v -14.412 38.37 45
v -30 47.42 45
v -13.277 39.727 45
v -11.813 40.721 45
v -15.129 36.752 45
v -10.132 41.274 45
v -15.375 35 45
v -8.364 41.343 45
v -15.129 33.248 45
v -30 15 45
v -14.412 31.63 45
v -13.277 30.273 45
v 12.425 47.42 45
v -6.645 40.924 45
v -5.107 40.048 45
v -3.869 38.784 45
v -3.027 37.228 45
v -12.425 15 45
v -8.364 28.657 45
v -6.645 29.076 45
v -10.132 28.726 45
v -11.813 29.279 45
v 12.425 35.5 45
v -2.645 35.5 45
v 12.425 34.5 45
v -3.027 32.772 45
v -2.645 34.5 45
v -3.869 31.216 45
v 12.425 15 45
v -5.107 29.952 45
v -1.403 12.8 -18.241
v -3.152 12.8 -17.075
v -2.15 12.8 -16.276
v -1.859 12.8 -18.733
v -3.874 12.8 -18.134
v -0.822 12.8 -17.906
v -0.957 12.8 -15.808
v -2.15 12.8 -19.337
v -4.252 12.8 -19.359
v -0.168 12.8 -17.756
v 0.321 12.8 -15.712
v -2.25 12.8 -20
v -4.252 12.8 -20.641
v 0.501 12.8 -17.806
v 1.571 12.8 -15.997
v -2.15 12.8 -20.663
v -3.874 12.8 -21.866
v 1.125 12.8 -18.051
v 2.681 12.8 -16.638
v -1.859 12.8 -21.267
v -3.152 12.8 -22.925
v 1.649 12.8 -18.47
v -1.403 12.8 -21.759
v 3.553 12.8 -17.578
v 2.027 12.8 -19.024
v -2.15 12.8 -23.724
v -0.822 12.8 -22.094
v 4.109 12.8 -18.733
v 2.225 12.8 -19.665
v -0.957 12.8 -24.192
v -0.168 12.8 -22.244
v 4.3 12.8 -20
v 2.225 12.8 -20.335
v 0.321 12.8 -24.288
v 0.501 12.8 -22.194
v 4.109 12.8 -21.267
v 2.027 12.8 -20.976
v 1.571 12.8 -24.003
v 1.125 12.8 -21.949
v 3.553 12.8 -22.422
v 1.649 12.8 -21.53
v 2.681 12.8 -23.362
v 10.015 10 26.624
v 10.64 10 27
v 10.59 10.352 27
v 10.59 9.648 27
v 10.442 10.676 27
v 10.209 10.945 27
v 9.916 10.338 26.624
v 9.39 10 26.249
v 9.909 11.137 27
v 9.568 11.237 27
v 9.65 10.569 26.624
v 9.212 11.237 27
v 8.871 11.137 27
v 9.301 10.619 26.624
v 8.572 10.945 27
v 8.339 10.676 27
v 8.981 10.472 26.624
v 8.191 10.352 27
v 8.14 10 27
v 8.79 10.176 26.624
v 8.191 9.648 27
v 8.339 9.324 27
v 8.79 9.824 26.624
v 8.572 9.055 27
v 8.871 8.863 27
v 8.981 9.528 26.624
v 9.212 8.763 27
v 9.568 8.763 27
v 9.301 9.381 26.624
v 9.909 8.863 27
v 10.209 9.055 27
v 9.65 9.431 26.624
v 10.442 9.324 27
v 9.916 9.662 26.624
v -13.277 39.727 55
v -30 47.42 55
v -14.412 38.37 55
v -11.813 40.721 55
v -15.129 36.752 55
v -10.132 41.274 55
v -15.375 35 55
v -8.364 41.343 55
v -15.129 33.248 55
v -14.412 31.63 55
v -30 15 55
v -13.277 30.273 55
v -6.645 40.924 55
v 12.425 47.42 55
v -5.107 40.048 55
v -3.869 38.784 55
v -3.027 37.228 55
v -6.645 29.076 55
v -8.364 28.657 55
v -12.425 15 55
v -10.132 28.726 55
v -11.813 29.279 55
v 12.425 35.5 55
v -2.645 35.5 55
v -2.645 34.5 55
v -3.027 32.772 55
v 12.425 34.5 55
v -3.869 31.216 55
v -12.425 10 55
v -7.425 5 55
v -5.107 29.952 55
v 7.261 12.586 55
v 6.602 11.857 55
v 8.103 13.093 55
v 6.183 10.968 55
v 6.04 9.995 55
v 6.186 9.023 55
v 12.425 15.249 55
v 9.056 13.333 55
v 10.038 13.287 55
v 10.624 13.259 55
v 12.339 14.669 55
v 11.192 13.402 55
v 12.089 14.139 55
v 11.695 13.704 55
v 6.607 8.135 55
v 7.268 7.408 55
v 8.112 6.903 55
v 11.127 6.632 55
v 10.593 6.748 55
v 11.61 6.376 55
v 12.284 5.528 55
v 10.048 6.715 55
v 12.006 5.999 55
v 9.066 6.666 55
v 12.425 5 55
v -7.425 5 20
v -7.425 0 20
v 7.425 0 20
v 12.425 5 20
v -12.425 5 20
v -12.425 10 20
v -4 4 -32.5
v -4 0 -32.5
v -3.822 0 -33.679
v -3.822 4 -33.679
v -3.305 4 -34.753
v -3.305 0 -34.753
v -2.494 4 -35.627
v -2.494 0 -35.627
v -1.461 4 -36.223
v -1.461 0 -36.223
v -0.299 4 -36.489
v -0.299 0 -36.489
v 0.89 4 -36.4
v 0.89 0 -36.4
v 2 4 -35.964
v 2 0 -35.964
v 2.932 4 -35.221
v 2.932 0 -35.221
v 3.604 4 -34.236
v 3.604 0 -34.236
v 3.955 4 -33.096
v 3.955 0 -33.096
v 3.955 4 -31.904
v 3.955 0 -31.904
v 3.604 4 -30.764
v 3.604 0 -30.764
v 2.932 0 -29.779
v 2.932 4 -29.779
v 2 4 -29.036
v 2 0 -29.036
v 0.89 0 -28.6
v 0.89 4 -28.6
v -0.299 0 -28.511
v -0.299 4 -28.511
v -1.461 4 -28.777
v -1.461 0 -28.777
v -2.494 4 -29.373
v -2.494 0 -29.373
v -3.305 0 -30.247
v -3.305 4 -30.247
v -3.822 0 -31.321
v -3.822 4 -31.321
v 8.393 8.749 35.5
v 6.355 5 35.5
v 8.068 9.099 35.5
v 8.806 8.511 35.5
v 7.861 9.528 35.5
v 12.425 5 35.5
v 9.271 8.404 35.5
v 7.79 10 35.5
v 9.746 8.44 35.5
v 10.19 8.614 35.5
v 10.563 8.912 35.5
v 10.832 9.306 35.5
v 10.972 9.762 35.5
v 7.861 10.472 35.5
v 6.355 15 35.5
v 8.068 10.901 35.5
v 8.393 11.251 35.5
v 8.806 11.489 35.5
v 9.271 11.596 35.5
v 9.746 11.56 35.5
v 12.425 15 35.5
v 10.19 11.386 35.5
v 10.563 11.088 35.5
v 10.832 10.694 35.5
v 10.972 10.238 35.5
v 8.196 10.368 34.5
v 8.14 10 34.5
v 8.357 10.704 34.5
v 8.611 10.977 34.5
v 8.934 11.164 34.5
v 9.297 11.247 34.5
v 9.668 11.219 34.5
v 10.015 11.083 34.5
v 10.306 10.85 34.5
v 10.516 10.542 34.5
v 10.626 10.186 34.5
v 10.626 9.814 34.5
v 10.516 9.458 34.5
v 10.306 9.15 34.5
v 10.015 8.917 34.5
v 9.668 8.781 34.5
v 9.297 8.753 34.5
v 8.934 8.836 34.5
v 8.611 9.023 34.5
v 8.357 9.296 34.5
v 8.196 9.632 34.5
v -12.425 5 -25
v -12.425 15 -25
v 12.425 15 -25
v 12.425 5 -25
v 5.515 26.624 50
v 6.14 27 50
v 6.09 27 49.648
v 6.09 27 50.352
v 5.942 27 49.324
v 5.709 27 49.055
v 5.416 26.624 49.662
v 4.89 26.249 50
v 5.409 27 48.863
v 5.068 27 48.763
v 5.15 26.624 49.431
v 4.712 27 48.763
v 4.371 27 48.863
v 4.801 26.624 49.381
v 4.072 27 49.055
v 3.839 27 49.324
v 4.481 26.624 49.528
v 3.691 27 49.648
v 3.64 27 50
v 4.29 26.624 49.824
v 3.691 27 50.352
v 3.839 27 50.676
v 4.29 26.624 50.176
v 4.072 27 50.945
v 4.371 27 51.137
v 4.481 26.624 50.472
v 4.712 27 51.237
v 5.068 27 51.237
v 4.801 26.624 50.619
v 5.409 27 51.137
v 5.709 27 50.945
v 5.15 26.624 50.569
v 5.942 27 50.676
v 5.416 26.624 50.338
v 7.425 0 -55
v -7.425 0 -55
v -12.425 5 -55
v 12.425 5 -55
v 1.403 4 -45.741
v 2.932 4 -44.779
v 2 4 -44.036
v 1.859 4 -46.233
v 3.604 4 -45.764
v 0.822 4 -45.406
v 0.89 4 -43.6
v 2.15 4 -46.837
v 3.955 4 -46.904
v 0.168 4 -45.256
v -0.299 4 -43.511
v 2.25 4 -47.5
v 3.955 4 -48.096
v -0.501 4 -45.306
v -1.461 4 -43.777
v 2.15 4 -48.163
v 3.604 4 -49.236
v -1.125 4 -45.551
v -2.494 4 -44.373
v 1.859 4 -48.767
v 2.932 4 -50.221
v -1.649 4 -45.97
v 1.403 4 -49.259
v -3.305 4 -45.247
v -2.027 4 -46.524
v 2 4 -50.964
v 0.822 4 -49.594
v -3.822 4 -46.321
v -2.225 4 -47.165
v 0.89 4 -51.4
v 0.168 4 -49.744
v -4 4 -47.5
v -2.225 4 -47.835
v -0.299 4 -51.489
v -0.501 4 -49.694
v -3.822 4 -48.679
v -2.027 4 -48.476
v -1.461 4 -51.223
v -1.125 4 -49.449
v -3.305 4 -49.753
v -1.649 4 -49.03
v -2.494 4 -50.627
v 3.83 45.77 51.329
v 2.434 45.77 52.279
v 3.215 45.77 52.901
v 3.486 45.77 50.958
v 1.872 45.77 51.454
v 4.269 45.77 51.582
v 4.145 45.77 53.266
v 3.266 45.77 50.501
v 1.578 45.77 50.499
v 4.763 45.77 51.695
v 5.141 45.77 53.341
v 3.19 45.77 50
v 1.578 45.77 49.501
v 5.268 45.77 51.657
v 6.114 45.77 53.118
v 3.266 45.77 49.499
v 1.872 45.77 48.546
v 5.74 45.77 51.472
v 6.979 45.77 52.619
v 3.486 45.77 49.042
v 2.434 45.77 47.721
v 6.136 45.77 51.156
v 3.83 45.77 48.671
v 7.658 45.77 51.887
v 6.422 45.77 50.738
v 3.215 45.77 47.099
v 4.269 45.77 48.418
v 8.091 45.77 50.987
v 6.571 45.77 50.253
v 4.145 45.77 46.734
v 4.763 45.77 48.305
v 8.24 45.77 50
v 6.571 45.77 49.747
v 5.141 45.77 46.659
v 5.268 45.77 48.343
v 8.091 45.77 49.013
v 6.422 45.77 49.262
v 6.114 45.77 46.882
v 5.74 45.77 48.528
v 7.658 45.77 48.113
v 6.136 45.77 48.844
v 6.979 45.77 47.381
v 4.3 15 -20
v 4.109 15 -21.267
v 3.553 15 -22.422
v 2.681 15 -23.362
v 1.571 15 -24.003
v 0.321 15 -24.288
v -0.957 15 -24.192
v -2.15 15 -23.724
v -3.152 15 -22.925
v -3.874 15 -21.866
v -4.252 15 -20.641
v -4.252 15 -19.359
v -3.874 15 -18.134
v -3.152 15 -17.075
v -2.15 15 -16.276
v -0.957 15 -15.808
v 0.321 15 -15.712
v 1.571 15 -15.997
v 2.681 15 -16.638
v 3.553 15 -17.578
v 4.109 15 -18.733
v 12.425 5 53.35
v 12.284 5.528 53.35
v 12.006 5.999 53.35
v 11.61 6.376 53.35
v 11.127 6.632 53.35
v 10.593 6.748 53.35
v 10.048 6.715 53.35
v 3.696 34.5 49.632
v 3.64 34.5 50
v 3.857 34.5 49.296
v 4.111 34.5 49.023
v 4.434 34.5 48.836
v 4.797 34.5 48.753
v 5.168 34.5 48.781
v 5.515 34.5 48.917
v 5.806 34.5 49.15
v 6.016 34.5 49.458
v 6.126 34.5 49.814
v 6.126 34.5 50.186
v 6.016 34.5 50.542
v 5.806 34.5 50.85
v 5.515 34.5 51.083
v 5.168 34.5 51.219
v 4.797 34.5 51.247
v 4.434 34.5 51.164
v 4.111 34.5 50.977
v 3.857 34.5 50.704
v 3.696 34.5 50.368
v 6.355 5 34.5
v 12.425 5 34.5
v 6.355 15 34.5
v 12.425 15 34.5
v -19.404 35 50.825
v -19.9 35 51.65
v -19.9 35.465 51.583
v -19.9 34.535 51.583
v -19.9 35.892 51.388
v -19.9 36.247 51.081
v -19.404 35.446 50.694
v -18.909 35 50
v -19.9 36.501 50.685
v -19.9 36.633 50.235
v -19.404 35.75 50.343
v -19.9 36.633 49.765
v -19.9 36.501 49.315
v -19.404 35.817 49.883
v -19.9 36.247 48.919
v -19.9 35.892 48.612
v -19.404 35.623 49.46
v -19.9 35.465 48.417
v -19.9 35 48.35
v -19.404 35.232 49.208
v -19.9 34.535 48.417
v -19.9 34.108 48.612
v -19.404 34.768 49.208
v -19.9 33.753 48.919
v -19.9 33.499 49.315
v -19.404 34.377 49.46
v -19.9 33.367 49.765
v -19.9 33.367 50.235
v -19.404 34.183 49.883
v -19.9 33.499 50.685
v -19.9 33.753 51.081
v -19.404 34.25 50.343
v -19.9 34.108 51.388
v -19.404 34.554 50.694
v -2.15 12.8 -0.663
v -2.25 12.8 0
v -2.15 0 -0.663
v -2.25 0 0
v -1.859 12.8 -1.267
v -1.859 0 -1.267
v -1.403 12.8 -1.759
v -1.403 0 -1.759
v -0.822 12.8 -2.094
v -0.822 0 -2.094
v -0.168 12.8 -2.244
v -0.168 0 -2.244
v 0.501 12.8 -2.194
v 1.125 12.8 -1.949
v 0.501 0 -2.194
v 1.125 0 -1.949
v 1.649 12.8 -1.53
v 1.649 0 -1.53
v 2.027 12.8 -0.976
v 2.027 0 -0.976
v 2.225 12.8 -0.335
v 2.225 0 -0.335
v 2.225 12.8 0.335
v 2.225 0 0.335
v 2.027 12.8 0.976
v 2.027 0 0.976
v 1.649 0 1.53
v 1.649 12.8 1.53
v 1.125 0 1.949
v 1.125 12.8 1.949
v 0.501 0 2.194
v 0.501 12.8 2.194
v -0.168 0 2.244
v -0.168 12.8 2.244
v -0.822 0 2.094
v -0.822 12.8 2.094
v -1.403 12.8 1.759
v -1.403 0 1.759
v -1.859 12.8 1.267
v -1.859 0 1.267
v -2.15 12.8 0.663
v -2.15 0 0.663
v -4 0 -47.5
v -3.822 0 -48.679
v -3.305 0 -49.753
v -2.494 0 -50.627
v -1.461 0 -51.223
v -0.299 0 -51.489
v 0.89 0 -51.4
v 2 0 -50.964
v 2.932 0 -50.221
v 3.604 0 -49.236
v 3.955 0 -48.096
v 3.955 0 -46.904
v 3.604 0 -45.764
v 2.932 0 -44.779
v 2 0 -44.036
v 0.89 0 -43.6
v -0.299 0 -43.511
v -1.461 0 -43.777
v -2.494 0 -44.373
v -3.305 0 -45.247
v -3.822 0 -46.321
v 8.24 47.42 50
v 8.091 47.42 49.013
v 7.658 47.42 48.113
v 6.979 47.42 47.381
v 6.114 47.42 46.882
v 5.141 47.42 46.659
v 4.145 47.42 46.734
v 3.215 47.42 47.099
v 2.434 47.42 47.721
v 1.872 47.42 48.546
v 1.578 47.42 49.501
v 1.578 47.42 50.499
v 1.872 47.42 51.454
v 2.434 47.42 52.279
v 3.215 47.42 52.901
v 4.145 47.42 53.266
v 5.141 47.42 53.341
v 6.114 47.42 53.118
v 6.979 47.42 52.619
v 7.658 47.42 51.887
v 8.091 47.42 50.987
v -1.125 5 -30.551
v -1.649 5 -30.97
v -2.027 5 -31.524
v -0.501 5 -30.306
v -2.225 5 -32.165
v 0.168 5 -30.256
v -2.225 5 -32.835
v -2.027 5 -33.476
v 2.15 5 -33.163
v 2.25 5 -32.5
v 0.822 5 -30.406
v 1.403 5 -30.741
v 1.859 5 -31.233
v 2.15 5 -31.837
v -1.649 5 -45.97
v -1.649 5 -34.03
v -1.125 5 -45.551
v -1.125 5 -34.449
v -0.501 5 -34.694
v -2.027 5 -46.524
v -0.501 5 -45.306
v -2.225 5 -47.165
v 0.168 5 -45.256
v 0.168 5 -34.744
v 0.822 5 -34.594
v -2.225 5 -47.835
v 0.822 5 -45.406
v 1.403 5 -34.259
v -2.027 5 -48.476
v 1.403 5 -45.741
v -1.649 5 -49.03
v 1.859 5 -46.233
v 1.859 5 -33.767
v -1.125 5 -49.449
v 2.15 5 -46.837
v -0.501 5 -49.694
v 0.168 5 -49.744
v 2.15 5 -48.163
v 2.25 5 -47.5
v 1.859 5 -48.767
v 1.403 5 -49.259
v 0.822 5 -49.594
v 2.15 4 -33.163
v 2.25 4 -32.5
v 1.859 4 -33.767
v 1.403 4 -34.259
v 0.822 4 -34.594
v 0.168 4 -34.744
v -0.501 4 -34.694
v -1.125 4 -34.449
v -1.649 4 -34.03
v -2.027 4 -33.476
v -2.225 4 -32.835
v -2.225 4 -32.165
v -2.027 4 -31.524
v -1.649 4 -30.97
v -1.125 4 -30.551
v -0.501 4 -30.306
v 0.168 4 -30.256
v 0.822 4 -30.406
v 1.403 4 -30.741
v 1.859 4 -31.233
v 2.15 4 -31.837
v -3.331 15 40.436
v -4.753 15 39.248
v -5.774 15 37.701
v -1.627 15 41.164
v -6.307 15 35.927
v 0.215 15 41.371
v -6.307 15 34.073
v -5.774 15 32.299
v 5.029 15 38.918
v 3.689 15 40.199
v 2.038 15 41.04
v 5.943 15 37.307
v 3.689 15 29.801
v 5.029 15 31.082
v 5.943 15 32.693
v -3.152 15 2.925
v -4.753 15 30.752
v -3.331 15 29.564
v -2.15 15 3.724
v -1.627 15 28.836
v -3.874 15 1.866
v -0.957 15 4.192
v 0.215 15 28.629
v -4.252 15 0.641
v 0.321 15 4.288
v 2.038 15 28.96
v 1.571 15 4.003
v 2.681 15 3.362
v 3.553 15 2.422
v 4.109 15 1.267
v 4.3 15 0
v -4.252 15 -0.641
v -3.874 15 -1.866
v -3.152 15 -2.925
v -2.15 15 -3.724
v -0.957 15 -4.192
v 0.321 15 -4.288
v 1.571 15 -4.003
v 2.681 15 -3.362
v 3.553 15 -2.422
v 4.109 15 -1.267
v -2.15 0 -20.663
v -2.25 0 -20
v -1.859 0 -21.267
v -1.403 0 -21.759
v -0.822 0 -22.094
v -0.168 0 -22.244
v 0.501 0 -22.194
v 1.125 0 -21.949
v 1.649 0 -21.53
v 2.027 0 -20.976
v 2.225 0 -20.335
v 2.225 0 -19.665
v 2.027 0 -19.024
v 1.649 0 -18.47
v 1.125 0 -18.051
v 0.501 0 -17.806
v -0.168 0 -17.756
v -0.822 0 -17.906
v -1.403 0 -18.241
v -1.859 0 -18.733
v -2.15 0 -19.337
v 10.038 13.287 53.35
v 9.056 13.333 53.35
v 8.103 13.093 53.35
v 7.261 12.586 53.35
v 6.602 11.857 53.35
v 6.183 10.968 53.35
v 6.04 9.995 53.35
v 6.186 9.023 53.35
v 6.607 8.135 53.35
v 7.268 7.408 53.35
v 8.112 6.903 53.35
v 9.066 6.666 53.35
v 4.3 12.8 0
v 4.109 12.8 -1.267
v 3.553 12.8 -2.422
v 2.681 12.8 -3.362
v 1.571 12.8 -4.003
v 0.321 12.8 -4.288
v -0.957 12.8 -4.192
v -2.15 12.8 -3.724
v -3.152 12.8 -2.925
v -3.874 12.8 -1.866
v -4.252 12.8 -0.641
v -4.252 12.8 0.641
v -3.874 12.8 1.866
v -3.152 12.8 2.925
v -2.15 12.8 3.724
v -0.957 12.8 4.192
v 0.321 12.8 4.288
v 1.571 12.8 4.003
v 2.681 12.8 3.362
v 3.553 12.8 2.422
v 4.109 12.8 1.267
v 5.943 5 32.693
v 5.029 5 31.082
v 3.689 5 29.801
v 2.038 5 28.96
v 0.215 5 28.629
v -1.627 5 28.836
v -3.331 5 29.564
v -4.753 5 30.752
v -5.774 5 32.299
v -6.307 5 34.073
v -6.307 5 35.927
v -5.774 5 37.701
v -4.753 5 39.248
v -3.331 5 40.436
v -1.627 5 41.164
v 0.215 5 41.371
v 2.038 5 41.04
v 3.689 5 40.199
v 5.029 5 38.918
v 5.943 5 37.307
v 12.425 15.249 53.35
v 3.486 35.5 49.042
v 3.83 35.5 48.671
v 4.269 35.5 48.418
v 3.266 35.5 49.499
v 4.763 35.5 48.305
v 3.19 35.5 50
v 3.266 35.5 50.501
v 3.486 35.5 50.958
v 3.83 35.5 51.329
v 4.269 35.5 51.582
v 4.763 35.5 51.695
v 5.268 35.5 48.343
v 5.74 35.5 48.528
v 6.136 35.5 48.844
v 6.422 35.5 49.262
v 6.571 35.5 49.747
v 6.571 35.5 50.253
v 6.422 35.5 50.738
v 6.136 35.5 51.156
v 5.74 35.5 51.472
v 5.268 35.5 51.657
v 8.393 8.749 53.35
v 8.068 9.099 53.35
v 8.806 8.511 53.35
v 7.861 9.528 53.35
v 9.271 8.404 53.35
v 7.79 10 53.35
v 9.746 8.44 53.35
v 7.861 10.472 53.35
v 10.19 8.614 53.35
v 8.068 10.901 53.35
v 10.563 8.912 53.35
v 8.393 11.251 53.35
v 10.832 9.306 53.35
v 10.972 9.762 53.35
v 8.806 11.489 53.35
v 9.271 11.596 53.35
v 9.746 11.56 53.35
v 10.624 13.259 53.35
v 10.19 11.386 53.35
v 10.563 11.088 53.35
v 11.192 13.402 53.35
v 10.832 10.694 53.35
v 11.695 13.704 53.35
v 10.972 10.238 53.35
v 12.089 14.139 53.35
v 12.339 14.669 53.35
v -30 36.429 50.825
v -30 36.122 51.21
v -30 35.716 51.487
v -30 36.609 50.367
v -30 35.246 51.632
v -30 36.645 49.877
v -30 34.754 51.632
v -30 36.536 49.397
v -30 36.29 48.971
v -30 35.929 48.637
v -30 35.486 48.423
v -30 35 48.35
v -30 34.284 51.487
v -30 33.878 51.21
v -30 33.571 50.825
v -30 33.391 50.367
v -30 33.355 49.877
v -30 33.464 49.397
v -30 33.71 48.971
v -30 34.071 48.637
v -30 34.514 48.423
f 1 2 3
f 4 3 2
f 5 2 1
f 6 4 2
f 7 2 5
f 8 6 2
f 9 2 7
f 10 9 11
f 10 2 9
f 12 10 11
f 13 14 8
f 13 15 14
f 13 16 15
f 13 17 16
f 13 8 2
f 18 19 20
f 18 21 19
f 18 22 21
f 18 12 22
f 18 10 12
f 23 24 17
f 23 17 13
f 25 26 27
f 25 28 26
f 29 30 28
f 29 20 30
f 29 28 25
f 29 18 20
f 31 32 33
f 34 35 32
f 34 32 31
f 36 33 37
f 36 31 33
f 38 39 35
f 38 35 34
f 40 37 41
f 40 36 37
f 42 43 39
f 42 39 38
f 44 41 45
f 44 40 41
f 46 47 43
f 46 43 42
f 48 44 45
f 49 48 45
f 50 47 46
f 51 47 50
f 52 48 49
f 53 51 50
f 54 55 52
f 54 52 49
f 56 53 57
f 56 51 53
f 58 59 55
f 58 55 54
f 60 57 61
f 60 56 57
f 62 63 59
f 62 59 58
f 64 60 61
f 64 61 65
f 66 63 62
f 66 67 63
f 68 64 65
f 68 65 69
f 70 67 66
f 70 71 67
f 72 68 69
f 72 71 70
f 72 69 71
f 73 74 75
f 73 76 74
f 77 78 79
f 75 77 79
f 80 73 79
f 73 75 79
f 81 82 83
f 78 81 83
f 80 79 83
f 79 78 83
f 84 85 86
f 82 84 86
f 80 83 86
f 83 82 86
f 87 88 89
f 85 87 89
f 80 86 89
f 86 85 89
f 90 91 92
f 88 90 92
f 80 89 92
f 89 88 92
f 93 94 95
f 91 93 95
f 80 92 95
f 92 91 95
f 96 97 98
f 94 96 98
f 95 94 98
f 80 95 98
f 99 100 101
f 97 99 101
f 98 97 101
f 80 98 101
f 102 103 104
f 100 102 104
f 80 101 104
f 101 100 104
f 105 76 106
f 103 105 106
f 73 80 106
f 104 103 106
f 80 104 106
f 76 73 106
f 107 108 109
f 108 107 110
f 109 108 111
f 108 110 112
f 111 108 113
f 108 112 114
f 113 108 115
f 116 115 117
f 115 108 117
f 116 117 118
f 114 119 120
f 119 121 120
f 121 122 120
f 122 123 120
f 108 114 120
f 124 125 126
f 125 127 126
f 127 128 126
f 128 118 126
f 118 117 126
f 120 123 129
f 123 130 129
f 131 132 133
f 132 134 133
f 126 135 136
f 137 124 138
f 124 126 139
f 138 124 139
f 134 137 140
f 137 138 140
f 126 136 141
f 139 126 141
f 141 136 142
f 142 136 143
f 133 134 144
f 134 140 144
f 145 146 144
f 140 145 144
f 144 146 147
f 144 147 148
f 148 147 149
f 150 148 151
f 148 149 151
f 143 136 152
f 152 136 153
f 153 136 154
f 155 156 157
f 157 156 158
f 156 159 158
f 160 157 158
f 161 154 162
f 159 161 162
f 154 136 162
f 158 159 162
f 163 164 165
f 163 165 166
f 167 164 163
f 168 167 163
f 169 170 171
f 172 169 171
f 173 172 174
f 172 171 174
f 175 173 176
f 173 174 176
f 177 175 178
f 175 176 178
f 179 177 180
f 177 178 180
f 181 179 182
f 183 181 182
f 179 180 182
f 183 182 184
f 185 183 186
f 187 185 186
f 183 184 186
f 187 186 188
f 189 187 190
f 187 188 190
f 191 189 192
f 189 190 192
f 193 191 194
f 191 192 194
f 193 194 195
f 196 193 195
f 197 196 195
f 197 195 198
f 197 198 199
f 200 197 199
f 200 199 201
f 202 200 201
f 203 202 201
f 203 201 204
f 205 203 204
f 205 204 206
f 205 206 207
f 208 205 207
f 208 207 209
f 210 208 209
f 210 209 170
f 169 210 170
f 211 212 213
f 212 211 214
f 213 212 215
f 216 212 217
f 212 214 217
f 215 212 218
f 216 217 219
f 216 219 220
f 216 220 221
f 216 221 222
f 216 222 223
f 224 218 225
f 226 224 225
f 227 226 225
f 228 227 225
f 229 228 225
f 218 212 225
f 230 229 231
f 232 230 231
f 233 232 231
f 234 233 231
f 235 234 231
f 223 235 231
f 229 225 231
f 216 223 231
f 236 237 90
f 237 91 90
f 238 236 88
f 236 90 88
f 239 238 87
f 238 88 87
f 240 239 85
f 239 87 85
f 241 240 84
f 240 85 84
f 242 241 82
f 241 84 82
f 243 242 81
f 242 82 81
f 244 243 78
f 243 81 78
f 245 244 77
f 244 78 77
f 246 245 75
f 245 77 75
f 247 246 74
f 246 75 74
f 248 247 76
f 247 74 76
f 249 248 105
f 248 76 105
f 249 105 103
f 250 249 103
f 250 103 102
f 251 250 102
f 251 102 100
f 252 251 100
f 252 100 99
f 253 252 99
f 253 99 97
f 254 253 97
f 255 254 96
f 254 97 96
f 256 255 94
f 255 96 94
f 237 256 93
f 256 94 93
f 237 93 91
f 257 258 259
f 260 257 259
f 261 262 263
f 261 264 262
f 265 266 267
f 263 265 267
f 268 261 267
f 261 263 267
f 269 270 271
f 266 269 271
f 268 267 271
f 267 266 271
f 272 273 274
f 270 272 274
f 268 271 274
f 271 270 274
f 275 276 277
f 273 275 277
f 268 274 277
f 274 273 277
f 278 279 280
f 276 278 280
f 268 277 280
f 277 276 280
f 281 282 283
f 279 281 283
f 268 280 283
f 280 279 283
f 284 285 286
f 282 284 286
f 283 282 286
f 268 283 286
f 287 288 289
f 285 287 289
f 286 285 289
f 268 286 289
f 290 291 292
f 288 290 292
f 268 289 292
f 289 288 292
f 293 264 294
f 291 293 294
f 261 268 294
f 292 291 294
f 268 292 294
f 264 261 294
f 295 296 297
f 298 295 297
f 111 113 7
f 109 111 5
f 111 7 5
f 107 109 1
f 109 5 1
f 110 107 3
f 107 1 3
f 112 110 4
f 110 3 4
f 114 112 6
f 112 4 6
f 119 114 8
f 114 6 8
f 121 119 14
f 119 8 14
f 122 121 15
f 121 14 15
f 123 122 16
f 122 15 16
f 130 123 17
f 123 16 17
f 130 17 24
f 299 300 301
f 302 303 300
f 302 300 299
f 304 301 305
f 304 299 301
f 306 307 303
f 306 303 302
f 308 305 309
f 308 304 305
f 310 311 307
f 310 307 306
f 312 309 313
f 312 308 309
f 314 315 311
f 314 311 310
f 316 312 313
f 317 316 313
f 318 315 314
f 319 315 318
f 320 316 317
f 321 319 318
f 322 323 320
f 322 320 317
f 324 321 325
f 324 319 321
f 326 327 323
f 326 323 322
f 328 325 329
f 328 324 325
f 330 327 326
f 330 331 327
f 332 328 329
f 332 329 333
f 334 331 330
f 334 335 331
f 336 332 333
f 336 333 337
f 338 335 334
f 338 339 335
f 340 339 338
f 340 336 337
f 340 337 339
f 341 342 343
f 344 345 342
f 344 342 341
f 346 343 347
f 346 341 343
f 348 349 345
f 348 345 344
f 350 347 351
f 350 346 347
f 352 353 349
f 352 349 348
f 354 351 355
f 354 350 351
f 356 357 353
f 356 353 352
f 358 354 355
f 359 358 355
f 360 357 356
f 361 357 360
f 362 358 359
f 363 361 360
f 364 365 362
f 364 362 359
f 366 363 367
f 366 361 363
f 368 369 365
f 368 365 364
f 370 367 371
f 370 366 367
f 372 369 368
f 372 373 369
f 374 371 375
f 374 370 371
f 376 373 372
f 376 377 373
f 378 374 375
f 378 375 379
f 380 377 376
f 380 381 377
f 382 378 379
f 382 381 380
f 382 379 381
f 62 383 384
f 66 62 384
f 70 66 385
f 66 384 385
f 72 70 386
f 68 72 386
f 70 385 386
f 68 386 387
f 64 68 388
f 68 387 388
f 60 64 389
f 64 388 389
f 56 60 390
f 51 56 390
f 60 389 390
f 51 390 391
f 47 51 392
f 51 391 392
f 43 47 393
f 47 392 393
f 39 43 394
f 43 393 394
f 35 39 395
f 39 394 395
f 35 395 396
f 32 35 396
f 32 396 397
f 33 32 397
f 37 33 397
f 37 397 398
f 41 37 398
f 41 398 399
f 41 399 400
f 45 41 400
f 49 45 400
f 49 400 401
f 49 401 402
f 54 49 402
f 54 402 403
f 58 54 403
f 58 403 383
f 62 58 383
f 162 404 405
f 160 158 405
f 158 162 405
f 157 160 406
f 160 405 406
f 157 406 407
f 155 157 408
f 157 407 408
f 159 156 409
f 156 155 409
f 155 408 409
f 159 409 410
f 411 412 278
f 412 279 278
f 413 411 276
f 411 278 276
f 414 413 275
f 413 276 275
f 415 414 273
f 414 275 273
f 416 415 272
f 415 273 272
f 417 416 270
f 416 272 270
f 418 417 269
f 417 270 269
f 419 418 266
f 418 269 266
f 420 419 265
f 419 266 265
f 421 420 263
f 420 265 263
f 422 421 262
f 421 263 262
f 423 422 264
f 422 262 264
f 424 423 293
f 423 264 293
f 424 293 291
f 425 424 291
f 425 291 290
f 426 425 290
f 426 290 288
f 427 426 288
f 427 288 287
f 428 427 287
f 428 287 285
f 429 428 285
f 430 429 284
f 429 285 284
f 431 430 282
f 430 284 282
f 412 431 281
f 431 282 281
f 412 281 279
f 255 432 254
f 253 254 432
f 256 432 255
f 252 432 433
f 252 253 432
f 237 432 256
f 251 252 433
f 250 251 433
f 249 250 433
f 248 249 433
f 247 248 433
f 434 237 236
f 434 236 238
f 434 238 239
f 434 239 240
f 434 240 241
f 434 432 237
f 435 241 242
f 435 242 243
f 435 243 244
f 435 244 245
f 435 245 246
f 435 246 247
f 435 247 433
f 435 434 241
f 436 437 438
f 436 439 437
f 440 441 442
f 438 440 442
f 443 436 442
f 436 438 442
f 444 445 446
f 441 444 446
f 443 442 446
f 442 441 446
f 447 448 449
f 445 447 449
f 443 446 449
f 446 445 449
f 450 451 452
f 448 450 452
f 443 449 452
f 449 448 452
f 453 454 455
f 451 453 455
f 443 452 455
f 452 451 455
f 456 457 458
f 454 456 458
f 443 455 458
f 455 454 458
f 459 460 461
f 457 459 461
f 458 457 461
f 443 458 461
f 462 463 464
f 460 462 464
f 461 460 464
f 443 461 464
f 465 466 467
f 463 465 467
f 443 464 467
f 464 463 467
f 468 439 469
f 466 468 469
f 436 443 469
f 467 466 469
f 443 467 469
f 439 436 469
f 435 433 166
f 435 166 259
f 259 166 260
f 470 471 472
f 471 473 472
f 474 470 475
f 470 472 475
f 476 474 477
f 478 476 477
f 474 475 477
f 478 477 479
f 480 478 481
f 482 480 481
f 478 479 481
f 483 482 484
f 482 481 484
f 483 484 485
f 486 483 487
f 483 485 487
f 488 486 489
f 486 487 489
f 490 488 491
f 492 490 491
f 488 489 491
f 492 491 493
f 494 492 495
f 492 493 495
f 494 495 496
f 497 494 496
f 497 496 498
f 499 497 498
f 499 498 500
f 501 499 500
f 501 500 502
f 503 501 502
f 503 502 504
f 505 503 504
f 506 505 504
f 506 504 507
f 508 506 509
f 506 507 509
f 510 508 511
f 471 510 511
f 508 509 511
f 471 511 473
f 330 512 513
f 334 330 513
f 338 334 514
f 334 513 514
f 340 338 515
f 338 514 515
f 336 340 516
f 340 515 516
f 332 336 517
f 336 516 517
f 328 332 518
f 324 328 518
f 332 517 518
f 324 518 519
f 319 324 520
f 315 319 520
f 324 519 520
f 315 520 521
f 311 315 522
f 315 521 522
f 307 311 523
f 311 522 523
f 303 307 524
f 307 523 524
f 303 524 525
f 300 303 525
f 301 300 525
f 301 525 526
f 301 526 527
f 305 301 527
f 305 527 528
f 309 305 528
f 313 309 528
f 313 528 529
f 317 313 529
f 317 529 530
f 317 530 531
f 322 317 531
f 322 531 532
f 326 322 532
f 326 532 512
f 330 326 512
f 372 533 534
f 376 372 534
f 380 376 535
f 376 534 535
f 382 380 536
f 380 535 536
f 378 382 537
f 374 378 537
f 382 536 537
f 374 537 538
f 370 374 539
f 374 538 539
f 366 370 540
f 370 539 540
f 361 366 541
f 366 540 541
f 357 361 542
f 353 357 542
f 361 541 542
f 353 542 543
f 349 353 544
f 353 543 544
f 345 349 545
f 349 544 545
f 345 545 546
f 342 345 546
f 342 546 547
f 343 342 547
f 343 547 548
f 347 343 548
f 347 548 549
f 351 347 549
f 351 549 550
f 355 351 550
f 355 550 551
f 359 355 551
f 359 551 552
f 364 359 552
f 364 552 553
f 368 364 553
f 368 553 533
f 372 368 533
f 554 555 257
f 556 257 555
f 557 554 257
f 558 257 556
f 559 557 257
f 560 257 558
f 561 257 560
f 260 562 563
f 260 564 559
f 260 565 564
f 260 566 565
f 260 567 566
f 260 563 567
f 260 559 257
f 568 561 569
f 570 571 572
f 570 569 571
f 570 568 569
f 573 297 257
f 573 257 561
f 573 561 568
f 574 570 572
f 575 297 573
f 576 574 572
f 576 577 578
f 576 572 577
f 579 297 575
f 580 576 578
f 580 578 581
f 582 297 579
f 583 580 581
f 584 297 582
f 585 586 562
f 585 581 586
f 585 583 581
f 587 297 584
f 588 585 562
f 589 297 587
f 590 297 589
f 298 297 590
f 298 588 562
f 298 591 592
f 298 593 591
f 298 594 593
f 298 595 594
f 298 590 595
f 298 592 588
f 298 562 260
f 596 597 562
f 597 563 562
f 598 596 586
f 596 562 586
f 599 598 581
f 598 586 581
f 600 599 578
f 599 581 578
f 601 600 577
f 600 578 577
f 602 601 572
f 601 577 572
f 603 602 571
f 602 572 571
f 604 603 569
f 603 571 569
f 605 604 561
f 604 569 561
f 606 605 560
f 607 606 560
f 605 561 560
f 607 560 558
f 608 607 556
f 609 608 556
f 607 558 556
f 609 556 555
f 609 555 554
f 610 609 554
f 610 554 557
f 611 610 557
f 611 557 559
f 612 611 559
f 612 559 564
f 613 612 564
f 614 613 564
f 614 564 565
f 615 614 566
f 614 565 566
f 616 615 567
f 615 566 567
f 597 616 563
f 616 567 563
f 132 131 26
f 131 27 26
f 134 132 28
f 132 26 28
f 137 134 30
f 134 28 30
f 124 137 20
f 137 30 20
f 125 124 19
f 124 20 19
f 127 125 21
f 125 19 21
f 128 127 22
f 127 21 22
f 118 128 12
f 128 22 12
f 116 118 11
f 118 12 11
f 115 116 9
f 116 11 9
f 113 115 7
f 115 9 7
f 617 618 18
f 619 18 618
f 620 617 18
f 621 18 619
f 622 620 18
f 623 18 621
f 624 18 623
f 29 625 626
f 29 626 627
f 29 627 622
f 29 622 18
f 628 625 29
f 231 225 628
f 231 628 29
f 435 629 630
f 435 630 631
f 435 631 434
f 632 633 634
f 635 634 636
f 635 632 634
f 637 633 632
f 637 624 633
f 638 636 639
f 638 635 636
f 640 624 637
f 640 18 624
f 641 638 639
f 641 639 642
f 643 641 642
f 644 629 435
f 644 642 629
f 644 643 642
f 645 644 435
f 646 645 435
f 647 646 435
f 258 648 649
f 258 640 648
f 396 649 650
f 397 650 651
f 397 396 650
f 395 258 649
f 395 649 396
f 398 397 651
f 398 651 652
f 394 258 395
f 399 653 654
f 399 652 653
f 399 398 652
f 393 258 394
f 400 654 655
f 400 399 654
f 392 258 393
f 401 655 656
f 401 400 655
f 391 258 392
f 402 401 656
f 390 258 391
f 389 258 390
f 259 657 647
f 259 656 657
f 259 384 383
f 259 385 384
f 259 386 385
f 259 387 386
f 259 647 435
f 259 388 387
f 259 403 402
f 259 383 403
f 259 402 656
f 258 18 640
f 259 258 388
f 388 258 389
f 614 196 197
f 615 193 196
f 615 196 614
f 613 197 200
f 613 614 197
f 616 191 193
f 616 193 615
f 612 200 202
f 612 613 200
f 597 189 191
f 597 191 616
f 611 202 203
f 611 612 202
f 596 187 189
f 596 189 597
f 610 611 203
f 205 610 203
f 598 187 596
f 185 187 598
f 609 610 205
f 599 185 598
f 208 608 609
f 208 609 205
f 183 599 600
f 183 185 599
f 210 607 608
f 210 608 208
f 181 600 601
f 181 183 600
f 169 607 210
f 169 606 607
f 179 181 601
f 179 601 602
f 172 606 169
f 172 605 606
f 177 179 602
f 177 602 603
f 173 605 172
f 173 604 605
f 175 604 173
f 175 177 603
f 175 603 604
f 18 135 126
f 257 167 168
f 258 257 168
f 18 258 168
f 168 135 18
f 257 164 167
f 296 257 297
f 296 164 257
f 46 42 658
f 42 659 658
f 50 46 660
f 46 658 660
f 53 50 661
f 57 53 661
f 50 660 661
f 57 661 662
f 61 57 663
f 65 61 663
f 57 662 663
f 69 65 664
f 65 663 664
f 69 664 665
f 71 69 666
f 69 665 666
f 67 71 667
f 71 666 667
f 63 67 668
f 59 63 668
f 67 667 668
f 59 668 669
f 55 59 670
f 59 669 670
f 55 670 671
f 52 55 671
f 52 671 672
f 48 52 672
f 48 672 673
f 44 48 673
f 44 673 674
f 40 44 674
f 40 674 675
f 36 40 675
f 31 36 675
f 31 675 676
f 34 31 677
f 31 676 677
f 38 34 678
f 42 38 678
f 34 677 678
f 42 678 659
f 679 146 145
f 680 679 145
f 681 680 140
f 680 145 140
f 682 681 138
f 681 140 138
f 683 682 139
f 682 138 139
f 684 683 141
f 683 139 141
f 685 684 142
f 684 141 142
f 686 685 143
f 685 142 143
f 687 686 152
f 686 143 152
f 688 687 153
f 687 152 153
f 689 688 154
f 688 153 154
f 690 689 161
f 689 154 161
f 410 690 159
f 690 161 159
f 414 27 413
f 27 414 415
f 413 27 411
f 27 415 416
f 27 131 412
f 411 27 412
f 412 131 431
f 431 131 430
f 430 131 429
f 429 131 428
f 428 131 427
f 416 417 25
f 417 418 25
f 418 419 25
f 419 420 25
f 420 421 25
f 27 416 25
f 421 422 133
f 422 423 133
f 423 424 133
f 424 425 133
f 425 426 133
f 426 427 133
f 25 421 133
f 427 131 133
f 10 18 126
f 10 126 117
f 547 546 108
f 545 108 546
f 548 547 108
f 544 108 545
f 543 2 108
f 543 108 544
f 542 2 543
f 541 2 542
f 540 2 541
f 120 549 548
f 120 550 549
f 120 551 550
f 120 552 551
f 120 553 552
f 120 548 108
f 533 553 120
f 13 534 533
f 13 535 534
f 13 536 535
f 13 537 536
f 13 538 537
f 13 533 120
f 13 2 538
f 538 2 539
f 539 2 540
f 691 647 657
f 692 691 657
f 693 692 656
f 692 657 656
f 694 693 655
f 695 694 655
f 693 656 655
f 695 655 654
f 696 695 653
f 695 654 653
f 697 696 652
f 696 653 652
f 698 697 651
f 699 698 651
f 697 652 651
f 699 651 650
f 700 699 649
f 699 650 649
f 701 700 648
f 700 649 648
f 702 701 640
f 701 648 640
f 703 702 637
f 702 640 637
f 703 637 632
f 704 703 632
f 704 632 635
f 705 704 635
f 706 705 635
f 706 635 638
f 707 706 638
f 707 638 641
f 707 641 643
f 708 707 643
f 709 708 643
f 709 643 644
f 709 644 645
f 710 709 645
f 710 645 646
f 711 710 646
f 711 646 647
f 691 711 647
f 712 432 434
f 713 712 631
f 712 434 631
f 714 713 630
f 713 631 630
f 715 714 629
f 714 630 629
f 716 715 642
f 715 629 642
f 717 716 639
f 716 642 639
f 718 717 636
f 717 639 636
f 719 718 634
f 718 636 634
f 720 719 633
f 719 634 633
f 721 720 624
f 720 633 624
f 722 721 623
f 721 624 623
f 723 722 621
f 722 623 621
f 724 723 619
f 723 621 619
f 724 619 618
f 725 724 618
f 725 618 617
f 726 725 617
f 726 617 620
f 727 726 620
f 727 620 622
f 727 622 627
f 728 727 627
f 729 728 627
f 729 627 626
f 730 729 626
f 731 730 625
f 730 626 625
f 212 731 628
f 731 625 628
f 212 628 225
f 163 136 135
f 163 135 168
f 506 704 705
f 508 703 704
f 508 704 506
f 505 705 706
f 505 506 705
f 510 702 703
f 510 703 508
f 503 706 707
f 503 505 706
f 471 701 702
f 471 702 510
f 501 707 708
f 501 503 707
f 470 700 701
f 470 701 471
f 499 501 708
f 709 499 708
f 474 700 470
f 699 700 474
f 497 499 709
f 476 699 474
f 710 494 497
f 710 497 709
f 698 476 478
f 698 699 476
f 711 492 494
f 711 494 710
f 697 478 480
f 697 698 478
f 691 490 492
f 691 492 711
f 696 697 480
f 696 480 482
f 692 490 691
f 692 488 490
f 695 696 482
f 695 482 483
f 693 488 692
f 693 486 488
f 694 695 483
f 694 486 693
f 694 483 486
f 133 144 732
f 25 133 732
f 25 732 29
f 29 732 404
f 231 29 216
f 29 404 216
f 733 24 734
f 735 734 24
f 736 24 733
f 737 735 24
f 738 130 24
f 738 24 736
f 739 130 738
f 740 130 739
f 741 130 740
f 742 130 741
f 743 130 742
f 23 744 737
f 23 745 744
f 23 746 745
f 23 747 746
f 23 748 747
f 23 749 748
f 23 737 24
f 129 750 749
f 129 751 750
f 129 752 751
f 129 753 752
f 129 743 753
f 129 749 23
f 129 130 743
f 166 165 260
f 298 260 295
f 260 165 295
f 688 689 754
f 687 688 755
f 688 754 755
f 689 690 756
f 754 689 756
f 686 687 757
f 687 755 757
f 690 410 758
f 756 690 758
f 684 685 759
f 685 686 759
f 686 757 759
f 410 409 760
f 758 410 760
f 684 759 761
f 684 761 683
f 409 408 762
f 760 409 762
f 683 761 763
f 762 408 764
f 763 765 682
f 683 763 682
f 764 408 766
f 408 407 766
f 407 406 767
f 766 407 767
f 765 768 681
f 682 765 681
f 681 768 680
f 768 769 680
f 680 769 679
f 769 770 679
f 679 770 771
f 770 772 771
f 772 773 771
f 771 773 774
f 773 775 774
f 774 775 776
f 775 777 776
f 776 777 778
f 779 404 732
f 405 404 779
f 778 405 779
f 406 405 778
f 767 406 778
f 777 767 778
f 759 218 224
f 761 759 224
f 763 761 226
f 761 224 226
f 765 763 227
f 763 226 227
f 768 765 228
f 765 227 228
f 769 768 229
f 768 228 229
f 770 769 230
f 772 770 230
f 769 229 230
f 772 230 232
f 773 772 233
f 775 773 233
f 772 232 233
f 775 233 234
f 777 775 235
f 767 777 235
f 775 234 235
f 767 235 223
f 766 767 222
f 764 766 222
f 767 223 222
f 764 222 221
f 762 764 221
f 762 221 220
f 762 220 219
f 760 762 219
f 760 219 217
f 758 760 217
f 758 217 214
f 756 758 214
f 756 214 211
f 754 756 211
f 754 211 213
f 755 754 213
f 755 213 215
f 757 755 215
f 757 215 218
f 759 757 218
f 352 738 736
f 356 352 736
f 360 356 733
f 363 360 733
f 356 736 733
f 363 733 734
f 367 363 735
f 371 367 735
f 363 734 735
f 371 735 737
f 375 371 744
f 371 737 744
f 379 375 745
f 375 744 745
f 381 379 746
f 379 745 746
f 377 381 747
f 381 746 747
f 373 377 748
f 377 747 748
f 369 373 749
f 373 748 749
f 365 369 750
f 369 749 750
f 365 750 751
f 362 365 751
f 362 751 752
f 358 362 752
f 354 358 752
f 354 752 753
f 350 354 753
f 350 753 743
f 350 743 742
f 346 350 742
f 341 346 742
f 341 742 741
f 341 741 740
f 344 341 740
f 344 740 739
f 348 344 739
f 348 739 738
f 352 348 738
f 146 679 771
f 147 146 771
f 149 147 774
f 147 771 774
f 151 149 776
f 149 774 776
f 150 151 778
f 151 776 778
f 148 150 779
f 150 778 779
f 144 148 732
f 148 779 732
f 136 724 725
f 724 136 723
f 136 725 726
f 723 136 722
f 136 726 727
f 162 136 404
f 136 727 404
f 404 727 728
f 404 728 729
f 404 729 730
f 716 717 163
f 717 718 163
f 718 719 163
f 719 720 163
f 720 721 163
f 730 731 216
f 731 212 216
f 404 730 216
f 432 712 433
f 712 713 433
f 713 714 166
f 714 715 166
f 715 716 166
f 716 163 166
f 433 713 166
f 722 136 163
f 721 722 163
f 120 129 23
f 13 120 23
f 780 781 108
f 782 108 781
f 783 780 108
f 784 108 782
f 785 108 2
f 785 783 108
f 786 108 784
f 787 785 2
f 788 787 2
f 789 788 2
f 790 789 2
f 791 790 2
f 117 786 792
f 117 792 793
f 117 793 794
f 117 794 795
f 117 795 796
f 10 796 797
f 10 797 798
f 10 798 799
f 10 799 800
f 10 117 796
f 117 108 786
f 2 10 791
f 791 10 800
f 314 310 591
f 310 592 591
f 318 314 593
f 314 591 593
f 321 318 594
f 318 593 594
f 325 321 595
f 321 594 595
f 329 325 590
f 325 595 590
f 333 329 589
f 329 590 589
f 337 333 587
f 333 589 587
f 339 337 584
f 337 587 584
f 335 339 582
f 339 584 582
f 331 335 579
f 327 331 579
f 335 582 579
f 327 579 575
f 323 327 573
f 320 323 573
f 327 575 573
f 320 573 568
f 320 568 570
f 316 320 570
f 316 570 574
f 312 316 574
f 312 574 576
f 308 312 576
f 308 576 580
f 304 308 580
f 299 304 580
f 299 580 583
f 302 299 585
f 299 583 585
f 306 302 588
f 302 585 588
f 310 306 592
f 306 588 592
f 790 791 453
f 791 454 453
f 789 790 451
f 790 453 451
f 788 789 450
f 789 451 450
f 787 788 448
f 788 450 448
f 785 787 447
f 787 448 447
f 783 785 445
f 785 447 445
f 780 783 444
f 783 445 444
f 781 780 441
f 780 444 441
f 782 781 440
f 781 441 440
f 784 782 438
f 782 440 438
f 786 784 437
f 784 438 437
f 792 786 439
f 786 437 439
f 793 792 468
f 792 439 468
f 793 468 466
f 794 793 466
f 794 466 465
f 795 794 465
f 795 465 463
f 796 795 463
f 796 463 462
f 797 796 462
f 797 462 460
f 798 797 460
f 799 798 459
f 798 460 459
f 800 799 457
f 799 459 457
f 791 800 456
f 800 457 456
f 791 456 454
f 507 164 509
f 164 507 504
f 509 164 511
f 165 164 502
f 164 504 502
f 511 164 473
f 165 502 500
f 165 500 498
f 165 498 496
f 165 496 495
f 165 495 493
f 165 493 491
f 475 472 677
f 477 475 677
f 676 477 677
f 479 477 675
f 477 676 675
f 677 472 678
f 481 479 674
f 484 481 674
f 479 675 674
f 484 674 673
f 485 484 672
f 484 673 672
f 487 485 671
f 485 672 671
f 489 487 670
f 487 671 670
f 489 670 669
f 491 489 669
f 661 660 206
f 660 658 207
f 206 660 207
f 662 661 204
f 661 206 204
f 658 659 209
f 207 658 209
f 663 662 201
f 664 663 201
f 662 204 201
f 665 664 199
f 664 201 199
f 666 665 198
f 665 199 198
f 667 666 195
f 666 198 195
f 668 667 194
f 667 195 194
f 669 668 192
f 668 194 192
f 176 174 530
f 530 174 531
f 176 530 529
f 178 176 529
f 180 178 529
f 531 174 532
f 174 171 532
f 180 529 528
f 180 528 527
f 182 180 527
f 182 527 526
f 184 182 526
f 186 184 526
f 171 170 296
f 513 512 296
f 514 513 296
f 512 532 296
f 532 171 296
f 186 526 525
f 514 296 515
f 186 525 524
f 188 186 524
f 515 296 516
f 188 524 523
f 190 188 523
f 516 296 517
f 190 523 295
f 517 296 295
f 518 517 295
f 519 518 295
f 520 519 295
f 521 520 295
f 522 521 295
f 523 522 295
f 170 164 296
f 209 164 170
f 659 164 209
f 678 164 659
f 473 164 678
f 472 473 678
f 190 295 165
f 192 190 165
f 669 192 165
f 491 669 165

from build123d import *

# Parameters (mm, degrees)
SKETCH1_W                       = 24.85
SKETCH1_H                       = 110
BOSS_EXTRUDE1_DEPTH             = 15
SKETCH2_W                       = 24.85
SKETCH2_H                       = 30
CUT_EXTRUDE1_DEPTH              = 10
SKETCH4_W                       = 35
SKETCH4_H                       = 5
CUT_EXTRUDE3_DEPTH              = 63.189408262
SKETCH5_W                       = 17.575
SKETCH5_H                       = 10
BOSS_EXTRUDE2_DEPTH             = 10
SKETCH6_W                       = 42.425
SKETCH6_H                       = 10
BOSS_EXTRUDE3_DEPTH             = 32.42
CHAMFER2_SIZE                   = 5
SKETCH7_R                       = 6.375
CUT_EXTRUDE4_DEPTH              = 71.541168122
SKETCH8_R                       = 6.375
CUT_EXTRUDE5_DEPTH              = 115.667590888
CBORE_FOR_M4_SHCS1_D            = 4.5
CBORE_FOR_M4_SHCS1_DEPTH        = 10.1
CBORE_FOR_M4_SHCS1_CBORE_D      = 8
CBORE_FOR_M4_SHCS1_CBORE_DEPTH  = 4
CBORE_FOR_M4_SHCS1_TIP          = 1.351936393
M4X0_7_TAPPED_HOLE1_D           = 3.3
SKETCH15_W                      = 17.575
SKETCH15_H                      = 10
CUT_EXTRUDE6_DEPTH              = 115.667590888
CHAMFER6_SIZE                   = 5
SKETCH16_W                      = 15
SKETCH16_H                      = 1
CUT_EXTRUDE7_DEPTH              = 71.541168122
CBORE_FOR_M3_SBHCS1_D           = 3.2
CBORE_FOR_M3_SBHCS1_DEPTH       = 19.5
CBORE_FOR_M3_SBHCS1_CBORE_D     = 6.7
CBORE_FOR_M3_SBHCS1_CBORE_DEPTH = 1.65
M3X0_5_TAPPED_HOLE1_D           = 2.5
M3X0_5_TAPPED_HOLE1_DEPTH       = 7.5
M3X0_5_TAPPED_HOLE1_TIP         = 0.751075774
CUT_EXTRUDE8_REACH              = 125.485
SKETCH24_W                      = 22
SKETCH24_H                      = 1
CBORE_FOR_M3_SBHCS2_D           = 3.4
CBORE_FOR_M3_SBHCS2_DEPTH       = 11.92
CBORE_FOR_M3_SBHCS2_CBORE_D     = 6.7
CBORE_FOR_M3_SBHCS2_CBORE_DEPTH = 1.65
M3X0_5_TAPPED_HOLE2_D           = 2.5
M3X0_5_TAPPED_HOLE2_DEPTH       = 7.5
M3X0_5_TAPPED_HOLE2_TIP         = 0.751075774
M4X0_7_TAPPED_HOLE2_D           = 3.3
M4X0_7_TAPPED_HOLE2_DEPTH       = 10.1
M4X0_7_TAPPED_HOLE2_TIP         = 0.991420021
CBORE_FOR_M4_SBHCS1_D           = 4.5
CBORE_FOR_M4_SBHCS1_CBORE_D     = 8.6
CBORE_FOR_M4_SBHCS1_CBORE_DEPTH = 2.2
FILLET2_R                       = 2


with BuildPart() as part:
    # Sketch1 → Boss-Extrude1 (new body)
    with BuildSketch(Plane(origin=(0, 0, 0), x_dir=(1, 0, 0), z_dir=(0, 1, 0))):
        Rectangle(SKETCH1_W, SKETCH1_H)
    extrude(amount=BOSS_EXTRUDE1_DEPTH)

    # Sketch2 → Cut-Extrude1 (cut)
    with BuildSketch(Plane(origin=(0, 15, 0), x_dir=(1, 0, 0), z_dir=(0, 1, 0))):
        with Locations((0, 40)):
            Rectangle(SKETCH2_W, SKETCH2_H)
    extrude(amount=-CUT_EXTRUDE1_DEPTH, mode=Mode.SUBTRACT)

    # Sketch4 → Cut-Extrude3 (cut, through all)
    with BuildSketch(Plane.ZY.offset(12.425)):
        with Locations((37.5, 2.5)):
            Rectangle(SKETCH4_W, SKETCH4_H)
    extrude(amount=-CUT_EXTRUDE3_DEPTH, mode=Mode.SUBTRACT)

    # Sketch5 → Boss-Extrude2 (add)
    with BuildSketch(Plane(origin=(0, 15, 0), x_dir=(1, 0, 0), z_dir=(0, 1, 0))):
        with Locations((-21.2125, -50)):
            Rectangle(SKETCH5_W, SKETCH5_H)
    extrude(amount=-BOSS_EXTRUDE2_DEPTH)

    # Sketch6 → Boss-Extrude3 (add)
    with BuildSketch(Plane(origin=(0, 15, 0), x_dir=(1, 0, 0), z_dir=(0, 1, 0))):
        with Locations((-8.7875, -50)):
            Rectangle(SKETCH6_W, SKETCH6_H)
    extrude(amount=BOSS_EXTRUDE3_DEPTH)

    # Chamfer2
    chamfer2_edges = [part.edges().sort_by_distance(p)[0] for p in [
        (12.425, 0, -17.5),
        (-12.425, 0, -17.5),
    ]]
    chamfer(chamfer2_edges, length=CHAMFER2_SIZE)

    # Sketch7 → Cut-Extrude4 (cut, through all)
    with BuildSketch(Plane(origin=(0, 15, 0), x_dir=(1, 0, 0), z_dir=(0, 1, 0))):
        with Locations(Location((0, -35, 0), (0, 0, 270))):
            Circle(SKETCH7_R)
    extrude(amount=-CUT_EXTRUDE4_DEPTH, mode=Mode.SUBTRACT)

    # Sketch8 → Cut-Extrude5 (cut, through all)
    with BuildSketch(Plane(origin=(0, 0, 45), x_dir=(-1, 0, 0), z_dir=(0, 0, -1))):
        with Locations((9, 35)):
            Circle(SKETCH8_R)
    extrude(amount=-CUT_EXTRUDE5_DEPTH, mode=Mode.SUBTRACT)

    # CBORE for M4 SHCS1
    with Locations(Plane(origin=(0, 0, 0), x_dir=(-1, 0, 0), z_dir=(0, -1, 0))):
        with Locations((0, 47.5), (0, 32.5)):
            CounterBoreHole(CBORE_FOR_M4_SHCS1_D / 2, CBORE_FOR_M4_SHCS1_CBORE_D / 2, CBORE_FOR_M4_SHCS1_CBORE_DEPTH, depth=CBORE_FOR_M4_SHCS1_DEPTH)
            with Locations((0, 0, -(CBORE_FOR_M4_SHCS1_DEPTH + CBORE_FOR_M4_SHCS1_TIP / 2))):  # 118° drill point
                Cone(0, CBORE_FOR_M4_SHCS1_D / 2, CBORE_FOR_M4_SHCS1_TIP, mode=Mode.SUBTRACT)

    # M4x0.7 Tapped Hole1 (through all)
    with Locations(Plane(origin=(0, 0, 0), x_dir=(-1, 0, 0), z_dir=(0, -1, 0))):
        with Locations((0, 20), (0, 0)):
            Hole(M4X0_7_TAPPED_HOLE1_D / 2)

    # Sketch15 → Cut-Extrude6 (cut, through all)
    with BuildSketch(Plane(origin=(0, 0, 45), x_dir=(-1, 0, 0), z_dir=(0, 0, -1))):
        with Locations((21.2125, 10)):
            Rectangle(SKETCH15_W, SKETCH15_H)
    extrude(amount=-CUT_EXTRUDE6_DEPTH, mode=Mode.SUBTRACT)

    # Chamfer6
    chamfer6_edges = [part.edges().sort_by_distance(p)[0] for p in [
        (-12.425, 5, 37.5),
    ]]
    chamfer(chamfer6_edges, length=CHAMFER6_SIZE)

    # Sketch16 → Cut-Extrude7 (cut, through all)
    with BuildSketch(Plane(origin=(0, 15, 0), x_dir=(1, 0, 0), z_dir=(0, 1, 0))):
        with Locations((12.425, -35)):
            Rectangle(SKETCH16_W, SKETCH16_H)
    extrude(amount=-CUT_EXTRUDE7_DEPTH, mode=Mode.SUBTRACT)

    # CBORE for M3 SBHCS1
    with Locations(Plane(origin=(9.390180955, 10, 55), x_dir=(1, 0, 0), z_dir=(0, 0, 1))):
        with Locations((0, 0)):
            CounterBoreHole(CBORE_FOR_M3_SBHCS1_D / 2, CBORE_FOR_M3_SBHCS1_CBORE_D / 2, CBORE_FOR_M3_SBHCS1_CBORE_DEPTH, depth=CBORE_FOR_M3_SBHCS1_DEPTH)

    # M3x0.5 Tapped Hole1
    with Locations(Plane.XY.offset(34.5)):
        with Locations((9.390180955, 10)):
            Hole(M3X0_5_TAPPED_HOLE1_D / 2, depth=M3X0_5_TAPPED_HOLE1_DEPTH)
            with Locations((0, 0, -(M3X0_5_TAPPED_HOLE1_DEPTH + M3X0_5_TAPPED_HOLE1_TIP / 2))):  # 118° drill point
                Cone(0, M3X0_5_TAPPED_HOLE1_D / 2, M3X0_5_TAPPED_HOLE1_TIP, mode=Mode.SUBTRACT)

    # Sketch24 → Cut-Extrude8 (cut, up to next)
    with BuildSketch(Plane.XY.offset(55), mode=Mode.PRIVATE) as cut_extrude8_sk1:
        with Locations((1.425, 35)):
            Rectangle(SKETCH24_W, SKETCH24_H)
    cut_extrude8_tool1 = extrude(cut_extrude8_sk1.sketch, amount=-CUT_EXTRUDE8_REACH, mode=Mode.PRIVATE) & part.part
    add(cut_extrude8_tool1.solids().sort_by_distance((1.425, 35, 55))[0], mode=Mode.SUBTRACT)

    # CBORE for M3 SBHCS2
    with Locations(Plane(origin=(0, 47.42, 0), x_dir=(1, 0, 0), z_dir=(0, 1, 0))):
        with Locations((4.890180955, -50)):
            CounterBoreHole(CBORE_FOR_M3_SBHCS2_D / 2, CBORE_FOR_M3_SBHCS2_CBORE_D / 2, CBORE_FOR_M3_SBHCS2_CBORE_DEPTH, depth=CBORE_FOR_M3_SBHCS2_DEPTH)

    # M3x0.5 Tapped Hole2
    with Locations(Plane(origin=(0, 34.5, 0), x_dir=(1, 0, 0), z_dir=(0, 1, 0))):
        with Locations((4.890180955, -50)):
            Hole(M3X0_5_TAPPED_HOLE2_D / 2, depth=M3X0_5_TAPPED_HOLE2_DEPTH)
            with Locations((0, 0, -(M3X0_5_TAPPED_HOLE2_DEPTH + M3X0_5_TAPPED_HOLE2_TIP / 2))):  # 118° drill point
                Cone(0, M3X0_5_TAPPED_HOLE2_D / 2, M3X0_5_TAPPED_HOLE2_TIP, mode=Mode.SUBTRACT)

    # M4x0.7 Tapped Hole2
    with Locations(Plane.ZY.offset(30)):
        with Locations((50, 35)):
            Hole(M4X0_7_TAPPED_HOLE2_D / 2, depth=M4X0_7_TAPPED_HOLE2_DEPTH)
            with Locations((0, 0, -(M4X0_7_TAPPED_HOLE2_DEPTH + M4X0_7_TAPPED_HOLE2_TIP / 2))):  # 118° drill point
                Cone(0, M4X0_7_TAPPED_HOLE2_D / 2, M4X0_7_TAPPED_HOLE2_TIP, mode=Mode.SUBTRACT)

    # CBORE for M4 SBHCS1 (through all)
    with Locations(Plane(origin=(0, 15, 0), x_dir=(1, 0, 0), z_dir=(0, 1, 0))):
        with Locations((0, 20), (0, 0)):
            CounterBoreHole(CBORE_FOR_M4_SBHCS1_D / 2, CBORE_FOR_M4_SBHCS1_CBORE_D / 2, CBORE_FOR_M4_SBHCS1_CBORE_DEPTH)

    # Fillet2
    # the kernel refuses this fillet: 2 mm, written as the material it takes off along each edge
    with BuildSketch(Plane(origin=(12.425, 11.418581462, 53.35), x_dir=(0, 1, 0), z_dir=(0, 0, 1))) as fillet2_piece_1:
        with BuildLine():
            CenterArc((3.83038506, 2), FILLET2_R, 168.847320213, 101.152679787)
            Line((1.868154584, 2.386848241), (1.828909975, 2.394585206))
            ThreePointArc((1.828909975, 2.394585206), (1.187961295, 0.994712466), (-0.016938286, 0.036236645))
            Line((-0.016938286, 0.036236645), (0, -0.04))
            Line((0, -0.04), (3.83038506, -0.04))
            Line((3.83038506, -0.04), (3.83038506, 0))
        make_face()
    extrude(amount=11.225962649, mode=Mode.SUBTRACT)
    with BuildSketch(Plane(origin=(12.425, 8.581418538, 53.35), x_dir=(0, -1, 0), z_dir=(0, 0, 1))) as fillet2_piece_2:
        with BuildLine():
            CenterArc((3.827369434, -1.984819427), FILLET2_R, 97.063855439, 94.254577376)
            Line((1.866266295, -2.377342649), (1.827044233, -2.385193113))
            ThreePointArc((1.827044233, -2.385193113), (1.18500762, -0.99094432), (-0.016938286, -0.036236645))
            Line((-0.016938286, -0.036236645), (0, 0.04))
            ThreePointArc((0, 0.04), (1.790709269, 0.04), (3.57649952, 0.039696389))
            Line((3.57649952, 0.039696389), (3.581418538, 0))
        make_face()
    extrude(amount=10.603546345, mode=Mode.SUBTRACT)


solid = part.part
